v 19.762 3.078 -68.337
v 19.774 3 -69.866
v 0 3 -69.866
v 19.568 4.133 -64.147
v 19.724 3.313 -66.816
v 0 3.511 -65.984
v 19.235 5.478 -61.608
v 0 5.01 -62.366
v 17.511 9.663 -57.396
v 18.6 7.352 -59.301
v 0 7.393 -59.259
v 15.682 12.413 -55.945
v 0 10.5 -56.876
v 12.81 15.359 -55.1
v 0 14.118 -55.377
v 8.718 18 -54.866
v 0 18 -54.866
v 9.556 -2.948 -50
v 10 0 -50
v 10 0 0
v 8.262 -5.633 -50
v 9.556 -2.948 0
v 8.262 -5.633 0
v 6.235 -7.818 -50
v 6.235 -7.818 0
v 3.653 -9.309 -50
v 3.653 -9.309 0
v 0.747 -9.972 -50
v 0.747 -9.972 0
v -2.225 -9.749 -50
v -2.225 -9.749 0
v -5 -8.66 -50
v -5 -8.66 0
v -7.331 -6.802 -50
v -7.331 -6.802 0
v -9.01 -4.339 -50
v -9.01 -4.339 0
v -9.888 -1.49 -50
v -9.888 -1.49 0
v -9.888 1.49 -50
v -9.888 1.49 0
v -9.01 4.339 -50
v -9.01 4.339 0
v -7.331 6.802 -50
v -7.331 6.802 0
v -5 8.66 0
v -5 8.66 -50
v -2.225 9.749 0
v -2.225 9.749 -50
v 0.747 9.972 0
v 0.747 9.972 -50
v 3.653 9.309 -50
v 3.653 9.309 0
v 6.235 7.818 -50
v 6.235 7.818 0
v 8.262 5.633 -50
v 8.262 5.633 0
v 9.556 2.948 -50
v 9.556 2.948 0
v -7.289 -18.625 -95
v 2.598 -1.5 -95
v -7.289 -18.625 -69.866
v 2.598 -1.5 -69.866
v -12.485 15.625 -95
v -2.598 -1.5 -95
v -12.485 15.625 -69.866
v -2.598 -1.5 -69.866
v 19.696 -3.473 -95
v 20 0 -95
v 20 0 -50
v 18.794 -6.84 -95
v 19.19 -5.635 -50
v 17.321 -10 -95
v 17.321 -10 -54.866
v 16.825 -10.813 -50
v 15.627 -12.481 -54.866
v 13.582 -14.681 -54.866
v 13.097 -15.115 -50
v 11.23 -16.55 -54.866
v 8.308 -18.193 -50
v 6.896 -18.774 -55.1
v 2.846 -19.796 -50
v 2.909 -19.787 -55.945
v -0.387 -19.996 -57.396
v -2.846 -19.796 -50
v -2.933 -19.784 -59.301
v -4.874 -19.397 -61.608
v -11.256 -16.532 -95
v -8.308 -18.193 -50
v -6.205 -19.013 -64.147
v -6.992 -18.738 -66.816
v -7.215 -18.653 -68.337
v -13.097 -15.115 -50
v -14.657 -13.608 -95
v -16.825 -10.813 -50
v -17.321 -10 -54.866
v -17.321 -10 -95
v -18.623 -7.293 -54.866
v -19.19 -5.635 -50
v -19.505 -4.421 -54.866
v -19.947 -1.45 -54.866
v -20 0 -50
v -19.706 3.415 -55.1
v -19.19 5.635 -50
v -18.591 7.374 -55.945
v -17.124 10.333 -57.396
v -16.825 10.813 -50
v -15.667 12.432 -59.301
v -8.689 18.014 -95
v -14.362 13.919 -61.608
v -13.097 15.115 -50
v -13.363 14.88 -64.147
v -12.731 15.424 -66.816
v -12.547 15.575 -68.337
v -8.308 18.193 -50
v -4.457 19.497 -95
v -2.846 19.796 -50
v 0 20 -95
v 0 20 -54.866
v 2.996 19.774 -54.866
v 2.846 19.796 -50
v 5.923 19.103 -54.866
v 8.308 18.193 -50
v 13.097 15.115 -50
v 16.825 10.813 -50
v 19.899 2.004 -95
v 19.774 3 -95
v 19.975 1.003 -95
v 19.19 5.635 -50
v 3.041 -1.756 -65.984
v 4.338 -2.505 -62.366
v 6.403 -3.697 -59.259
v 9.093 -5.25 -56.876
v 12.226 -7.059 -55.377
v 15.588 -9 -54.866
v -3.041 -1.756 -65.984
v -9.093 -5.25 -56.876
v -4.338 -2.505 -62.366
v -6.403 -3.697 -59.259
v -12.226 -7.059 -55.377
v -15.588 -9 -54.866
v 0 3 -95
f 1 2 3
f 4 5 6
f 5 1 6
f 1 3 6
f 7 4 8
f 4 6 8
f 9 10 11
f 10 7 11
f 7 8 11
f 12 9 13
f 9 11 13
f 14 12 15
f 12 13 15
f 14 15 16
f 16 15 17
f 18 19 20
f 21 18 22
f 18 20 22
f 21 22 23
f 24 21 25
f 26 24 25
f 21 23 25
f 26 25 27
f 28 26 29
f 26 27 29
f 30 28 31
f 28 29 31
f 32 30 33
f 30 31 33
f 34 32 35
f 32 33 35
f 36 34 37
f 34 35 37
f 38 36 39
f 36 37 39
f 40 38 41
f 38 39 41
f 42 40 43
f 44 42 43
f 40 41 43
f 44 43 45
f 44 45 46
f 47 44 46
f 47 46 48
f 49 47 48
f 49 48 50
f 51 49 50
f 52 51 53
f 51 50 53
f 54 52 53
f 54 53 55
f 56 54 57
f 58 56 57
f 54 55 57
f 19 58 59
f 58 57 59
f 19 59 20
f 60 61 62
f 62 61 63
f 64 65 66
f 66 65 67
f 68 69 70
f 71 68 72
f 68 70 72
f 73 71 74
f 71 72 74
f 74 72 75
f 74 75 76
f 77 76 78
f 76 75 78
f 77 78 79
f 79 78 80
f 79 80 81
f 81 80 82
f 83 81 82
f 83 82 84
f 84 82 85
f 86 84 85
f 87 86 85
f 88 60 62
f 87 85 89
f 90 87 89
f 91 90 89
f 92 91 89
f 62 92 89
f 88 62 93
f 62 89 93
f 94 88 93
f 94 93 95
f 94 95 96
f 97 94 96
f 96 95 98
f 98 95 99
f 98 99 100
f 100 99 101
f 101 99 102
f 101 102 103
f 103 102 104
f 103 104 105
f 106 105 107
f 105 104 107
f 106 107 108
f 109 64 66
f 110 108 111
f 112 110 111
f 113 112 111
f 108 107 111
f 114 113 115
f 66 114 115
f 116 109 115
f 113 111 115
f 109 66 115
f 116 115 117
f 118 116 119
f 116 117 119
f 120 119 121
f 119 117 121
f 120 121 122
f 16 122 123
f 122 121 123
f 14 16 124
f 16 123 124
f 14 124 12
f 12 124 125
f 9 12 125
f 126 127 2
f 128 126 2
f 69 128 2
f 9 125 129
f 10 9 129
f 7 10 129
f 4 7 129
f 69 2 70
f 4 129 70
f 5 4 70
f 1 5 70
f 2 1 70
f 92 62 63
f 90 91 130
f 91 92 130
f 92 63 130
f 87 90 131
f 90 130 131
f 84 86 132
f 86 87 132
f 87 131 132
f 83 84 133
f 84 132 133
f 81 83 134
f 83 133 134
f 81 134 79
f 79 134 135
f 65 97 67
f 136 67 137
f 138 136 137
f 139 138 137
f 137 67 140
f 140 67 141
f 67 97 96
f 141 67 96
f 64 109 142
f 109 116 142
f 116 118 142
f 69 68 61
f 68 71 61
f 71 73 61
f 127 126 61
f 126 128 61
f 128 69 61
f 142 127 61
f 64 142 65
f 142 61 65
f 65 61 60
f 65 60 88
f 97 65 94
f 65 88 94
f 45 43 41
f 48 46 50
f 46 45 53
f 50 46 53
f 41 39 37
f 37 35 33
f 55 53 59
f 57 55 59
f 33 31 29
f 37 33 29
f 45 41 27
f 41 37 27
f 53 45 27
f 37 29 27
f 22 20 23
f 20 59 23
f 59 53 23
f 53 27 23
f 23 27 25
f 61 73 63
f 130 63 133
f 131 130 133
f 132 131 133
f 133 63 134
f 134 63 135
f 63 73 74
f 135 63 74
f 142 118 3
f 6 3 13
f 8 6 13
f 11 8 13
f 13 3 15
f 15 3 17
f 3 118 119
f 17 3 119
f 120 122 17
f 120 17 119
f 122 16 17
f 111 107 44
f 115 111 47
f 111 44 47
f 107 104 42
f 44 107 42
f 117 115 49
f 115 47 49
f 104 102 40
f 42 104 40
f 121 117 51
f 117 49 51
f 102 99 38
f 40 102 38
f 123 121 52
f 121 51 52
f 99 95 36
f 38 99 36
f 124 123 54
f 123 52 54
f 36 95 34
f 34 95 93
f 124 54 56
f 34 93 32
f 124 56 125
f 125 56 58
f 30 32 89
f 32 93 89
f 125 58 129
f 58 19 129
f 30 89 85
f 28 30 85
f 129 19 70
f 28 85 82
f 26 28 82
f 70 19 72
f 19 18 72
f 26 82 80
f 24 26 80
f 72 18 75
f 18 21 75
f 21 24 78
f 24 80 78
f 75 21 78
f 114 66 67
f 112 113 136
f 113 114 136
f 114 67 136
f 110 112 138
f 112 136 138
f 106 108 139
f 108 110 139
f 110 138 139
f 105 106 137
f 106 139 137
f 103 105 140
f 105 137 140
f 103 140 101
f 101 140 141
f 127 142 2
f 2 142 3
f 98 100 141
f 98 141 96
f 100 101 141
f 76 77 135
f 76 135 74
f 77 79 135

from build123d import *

# Parameters (mm, degrees)
AUSFR_SUNG_DEPTH   = 21
KREISMUSTER1_COUNT = 3


with BuildPart() as part:
    # Skizze1 → Grundk_rper (revolve)
    with BuildSketch(Plane(origin=(0, 0, 0), x_dir=(0, 0, -1), z_dir=(1, 0, 0)), mode=Mode.PRIVATE) as grundk_rper_sk:
        Polygon((95, 0), (95, 20), (50, 20), (50, 10), (0, 10), (0, 0), align=None)
    revolve(grundk_rper_sk.sketch.rotate(Axis((0, 0, 0), (0, 0, -1)), 90), axis=Axis((0, 0, 0), (0, 0, -1)))  # turned: the seam where the file's is

    # Skizze2 → Ausfr_sung (cut, through all)
    with BuildSketch(Plane(origin=(0, 0, 0), x_dir=(0, 0, -1), z_dir=(1, 0, 0))):
        with BuildLine():
            Line((100, 3), (69.866068747, 3))
            ThreePointArc((69.866068747, 3), (59.25946703, 7.393398282), (54.866068747, 18))
            Line((54.866068747, 18), (54.866068747, 23))
            Line((54.866068747, 23), (100, 23))
            Line((100, 23), (100, 3))
        make_face()
    ausfr_sung = extrude(amount=AUSFR_SUNG_DEPTH, mode=Mode.SUBTRACT)

    # Kreismuster1: Ausfr_sung ×3 about axis
    kreismuster1_axis = Axis((0, 0, 0), (0, 0, 1))
    for i in range(1, KREISMUSTER1_COUNT):
        add(ausfr_sung.rotate(kreismuster1_axis, i * 360 / KREISMUSTER1_COUNT), mode=Mode.SUBTRACT)


solid = part.part
